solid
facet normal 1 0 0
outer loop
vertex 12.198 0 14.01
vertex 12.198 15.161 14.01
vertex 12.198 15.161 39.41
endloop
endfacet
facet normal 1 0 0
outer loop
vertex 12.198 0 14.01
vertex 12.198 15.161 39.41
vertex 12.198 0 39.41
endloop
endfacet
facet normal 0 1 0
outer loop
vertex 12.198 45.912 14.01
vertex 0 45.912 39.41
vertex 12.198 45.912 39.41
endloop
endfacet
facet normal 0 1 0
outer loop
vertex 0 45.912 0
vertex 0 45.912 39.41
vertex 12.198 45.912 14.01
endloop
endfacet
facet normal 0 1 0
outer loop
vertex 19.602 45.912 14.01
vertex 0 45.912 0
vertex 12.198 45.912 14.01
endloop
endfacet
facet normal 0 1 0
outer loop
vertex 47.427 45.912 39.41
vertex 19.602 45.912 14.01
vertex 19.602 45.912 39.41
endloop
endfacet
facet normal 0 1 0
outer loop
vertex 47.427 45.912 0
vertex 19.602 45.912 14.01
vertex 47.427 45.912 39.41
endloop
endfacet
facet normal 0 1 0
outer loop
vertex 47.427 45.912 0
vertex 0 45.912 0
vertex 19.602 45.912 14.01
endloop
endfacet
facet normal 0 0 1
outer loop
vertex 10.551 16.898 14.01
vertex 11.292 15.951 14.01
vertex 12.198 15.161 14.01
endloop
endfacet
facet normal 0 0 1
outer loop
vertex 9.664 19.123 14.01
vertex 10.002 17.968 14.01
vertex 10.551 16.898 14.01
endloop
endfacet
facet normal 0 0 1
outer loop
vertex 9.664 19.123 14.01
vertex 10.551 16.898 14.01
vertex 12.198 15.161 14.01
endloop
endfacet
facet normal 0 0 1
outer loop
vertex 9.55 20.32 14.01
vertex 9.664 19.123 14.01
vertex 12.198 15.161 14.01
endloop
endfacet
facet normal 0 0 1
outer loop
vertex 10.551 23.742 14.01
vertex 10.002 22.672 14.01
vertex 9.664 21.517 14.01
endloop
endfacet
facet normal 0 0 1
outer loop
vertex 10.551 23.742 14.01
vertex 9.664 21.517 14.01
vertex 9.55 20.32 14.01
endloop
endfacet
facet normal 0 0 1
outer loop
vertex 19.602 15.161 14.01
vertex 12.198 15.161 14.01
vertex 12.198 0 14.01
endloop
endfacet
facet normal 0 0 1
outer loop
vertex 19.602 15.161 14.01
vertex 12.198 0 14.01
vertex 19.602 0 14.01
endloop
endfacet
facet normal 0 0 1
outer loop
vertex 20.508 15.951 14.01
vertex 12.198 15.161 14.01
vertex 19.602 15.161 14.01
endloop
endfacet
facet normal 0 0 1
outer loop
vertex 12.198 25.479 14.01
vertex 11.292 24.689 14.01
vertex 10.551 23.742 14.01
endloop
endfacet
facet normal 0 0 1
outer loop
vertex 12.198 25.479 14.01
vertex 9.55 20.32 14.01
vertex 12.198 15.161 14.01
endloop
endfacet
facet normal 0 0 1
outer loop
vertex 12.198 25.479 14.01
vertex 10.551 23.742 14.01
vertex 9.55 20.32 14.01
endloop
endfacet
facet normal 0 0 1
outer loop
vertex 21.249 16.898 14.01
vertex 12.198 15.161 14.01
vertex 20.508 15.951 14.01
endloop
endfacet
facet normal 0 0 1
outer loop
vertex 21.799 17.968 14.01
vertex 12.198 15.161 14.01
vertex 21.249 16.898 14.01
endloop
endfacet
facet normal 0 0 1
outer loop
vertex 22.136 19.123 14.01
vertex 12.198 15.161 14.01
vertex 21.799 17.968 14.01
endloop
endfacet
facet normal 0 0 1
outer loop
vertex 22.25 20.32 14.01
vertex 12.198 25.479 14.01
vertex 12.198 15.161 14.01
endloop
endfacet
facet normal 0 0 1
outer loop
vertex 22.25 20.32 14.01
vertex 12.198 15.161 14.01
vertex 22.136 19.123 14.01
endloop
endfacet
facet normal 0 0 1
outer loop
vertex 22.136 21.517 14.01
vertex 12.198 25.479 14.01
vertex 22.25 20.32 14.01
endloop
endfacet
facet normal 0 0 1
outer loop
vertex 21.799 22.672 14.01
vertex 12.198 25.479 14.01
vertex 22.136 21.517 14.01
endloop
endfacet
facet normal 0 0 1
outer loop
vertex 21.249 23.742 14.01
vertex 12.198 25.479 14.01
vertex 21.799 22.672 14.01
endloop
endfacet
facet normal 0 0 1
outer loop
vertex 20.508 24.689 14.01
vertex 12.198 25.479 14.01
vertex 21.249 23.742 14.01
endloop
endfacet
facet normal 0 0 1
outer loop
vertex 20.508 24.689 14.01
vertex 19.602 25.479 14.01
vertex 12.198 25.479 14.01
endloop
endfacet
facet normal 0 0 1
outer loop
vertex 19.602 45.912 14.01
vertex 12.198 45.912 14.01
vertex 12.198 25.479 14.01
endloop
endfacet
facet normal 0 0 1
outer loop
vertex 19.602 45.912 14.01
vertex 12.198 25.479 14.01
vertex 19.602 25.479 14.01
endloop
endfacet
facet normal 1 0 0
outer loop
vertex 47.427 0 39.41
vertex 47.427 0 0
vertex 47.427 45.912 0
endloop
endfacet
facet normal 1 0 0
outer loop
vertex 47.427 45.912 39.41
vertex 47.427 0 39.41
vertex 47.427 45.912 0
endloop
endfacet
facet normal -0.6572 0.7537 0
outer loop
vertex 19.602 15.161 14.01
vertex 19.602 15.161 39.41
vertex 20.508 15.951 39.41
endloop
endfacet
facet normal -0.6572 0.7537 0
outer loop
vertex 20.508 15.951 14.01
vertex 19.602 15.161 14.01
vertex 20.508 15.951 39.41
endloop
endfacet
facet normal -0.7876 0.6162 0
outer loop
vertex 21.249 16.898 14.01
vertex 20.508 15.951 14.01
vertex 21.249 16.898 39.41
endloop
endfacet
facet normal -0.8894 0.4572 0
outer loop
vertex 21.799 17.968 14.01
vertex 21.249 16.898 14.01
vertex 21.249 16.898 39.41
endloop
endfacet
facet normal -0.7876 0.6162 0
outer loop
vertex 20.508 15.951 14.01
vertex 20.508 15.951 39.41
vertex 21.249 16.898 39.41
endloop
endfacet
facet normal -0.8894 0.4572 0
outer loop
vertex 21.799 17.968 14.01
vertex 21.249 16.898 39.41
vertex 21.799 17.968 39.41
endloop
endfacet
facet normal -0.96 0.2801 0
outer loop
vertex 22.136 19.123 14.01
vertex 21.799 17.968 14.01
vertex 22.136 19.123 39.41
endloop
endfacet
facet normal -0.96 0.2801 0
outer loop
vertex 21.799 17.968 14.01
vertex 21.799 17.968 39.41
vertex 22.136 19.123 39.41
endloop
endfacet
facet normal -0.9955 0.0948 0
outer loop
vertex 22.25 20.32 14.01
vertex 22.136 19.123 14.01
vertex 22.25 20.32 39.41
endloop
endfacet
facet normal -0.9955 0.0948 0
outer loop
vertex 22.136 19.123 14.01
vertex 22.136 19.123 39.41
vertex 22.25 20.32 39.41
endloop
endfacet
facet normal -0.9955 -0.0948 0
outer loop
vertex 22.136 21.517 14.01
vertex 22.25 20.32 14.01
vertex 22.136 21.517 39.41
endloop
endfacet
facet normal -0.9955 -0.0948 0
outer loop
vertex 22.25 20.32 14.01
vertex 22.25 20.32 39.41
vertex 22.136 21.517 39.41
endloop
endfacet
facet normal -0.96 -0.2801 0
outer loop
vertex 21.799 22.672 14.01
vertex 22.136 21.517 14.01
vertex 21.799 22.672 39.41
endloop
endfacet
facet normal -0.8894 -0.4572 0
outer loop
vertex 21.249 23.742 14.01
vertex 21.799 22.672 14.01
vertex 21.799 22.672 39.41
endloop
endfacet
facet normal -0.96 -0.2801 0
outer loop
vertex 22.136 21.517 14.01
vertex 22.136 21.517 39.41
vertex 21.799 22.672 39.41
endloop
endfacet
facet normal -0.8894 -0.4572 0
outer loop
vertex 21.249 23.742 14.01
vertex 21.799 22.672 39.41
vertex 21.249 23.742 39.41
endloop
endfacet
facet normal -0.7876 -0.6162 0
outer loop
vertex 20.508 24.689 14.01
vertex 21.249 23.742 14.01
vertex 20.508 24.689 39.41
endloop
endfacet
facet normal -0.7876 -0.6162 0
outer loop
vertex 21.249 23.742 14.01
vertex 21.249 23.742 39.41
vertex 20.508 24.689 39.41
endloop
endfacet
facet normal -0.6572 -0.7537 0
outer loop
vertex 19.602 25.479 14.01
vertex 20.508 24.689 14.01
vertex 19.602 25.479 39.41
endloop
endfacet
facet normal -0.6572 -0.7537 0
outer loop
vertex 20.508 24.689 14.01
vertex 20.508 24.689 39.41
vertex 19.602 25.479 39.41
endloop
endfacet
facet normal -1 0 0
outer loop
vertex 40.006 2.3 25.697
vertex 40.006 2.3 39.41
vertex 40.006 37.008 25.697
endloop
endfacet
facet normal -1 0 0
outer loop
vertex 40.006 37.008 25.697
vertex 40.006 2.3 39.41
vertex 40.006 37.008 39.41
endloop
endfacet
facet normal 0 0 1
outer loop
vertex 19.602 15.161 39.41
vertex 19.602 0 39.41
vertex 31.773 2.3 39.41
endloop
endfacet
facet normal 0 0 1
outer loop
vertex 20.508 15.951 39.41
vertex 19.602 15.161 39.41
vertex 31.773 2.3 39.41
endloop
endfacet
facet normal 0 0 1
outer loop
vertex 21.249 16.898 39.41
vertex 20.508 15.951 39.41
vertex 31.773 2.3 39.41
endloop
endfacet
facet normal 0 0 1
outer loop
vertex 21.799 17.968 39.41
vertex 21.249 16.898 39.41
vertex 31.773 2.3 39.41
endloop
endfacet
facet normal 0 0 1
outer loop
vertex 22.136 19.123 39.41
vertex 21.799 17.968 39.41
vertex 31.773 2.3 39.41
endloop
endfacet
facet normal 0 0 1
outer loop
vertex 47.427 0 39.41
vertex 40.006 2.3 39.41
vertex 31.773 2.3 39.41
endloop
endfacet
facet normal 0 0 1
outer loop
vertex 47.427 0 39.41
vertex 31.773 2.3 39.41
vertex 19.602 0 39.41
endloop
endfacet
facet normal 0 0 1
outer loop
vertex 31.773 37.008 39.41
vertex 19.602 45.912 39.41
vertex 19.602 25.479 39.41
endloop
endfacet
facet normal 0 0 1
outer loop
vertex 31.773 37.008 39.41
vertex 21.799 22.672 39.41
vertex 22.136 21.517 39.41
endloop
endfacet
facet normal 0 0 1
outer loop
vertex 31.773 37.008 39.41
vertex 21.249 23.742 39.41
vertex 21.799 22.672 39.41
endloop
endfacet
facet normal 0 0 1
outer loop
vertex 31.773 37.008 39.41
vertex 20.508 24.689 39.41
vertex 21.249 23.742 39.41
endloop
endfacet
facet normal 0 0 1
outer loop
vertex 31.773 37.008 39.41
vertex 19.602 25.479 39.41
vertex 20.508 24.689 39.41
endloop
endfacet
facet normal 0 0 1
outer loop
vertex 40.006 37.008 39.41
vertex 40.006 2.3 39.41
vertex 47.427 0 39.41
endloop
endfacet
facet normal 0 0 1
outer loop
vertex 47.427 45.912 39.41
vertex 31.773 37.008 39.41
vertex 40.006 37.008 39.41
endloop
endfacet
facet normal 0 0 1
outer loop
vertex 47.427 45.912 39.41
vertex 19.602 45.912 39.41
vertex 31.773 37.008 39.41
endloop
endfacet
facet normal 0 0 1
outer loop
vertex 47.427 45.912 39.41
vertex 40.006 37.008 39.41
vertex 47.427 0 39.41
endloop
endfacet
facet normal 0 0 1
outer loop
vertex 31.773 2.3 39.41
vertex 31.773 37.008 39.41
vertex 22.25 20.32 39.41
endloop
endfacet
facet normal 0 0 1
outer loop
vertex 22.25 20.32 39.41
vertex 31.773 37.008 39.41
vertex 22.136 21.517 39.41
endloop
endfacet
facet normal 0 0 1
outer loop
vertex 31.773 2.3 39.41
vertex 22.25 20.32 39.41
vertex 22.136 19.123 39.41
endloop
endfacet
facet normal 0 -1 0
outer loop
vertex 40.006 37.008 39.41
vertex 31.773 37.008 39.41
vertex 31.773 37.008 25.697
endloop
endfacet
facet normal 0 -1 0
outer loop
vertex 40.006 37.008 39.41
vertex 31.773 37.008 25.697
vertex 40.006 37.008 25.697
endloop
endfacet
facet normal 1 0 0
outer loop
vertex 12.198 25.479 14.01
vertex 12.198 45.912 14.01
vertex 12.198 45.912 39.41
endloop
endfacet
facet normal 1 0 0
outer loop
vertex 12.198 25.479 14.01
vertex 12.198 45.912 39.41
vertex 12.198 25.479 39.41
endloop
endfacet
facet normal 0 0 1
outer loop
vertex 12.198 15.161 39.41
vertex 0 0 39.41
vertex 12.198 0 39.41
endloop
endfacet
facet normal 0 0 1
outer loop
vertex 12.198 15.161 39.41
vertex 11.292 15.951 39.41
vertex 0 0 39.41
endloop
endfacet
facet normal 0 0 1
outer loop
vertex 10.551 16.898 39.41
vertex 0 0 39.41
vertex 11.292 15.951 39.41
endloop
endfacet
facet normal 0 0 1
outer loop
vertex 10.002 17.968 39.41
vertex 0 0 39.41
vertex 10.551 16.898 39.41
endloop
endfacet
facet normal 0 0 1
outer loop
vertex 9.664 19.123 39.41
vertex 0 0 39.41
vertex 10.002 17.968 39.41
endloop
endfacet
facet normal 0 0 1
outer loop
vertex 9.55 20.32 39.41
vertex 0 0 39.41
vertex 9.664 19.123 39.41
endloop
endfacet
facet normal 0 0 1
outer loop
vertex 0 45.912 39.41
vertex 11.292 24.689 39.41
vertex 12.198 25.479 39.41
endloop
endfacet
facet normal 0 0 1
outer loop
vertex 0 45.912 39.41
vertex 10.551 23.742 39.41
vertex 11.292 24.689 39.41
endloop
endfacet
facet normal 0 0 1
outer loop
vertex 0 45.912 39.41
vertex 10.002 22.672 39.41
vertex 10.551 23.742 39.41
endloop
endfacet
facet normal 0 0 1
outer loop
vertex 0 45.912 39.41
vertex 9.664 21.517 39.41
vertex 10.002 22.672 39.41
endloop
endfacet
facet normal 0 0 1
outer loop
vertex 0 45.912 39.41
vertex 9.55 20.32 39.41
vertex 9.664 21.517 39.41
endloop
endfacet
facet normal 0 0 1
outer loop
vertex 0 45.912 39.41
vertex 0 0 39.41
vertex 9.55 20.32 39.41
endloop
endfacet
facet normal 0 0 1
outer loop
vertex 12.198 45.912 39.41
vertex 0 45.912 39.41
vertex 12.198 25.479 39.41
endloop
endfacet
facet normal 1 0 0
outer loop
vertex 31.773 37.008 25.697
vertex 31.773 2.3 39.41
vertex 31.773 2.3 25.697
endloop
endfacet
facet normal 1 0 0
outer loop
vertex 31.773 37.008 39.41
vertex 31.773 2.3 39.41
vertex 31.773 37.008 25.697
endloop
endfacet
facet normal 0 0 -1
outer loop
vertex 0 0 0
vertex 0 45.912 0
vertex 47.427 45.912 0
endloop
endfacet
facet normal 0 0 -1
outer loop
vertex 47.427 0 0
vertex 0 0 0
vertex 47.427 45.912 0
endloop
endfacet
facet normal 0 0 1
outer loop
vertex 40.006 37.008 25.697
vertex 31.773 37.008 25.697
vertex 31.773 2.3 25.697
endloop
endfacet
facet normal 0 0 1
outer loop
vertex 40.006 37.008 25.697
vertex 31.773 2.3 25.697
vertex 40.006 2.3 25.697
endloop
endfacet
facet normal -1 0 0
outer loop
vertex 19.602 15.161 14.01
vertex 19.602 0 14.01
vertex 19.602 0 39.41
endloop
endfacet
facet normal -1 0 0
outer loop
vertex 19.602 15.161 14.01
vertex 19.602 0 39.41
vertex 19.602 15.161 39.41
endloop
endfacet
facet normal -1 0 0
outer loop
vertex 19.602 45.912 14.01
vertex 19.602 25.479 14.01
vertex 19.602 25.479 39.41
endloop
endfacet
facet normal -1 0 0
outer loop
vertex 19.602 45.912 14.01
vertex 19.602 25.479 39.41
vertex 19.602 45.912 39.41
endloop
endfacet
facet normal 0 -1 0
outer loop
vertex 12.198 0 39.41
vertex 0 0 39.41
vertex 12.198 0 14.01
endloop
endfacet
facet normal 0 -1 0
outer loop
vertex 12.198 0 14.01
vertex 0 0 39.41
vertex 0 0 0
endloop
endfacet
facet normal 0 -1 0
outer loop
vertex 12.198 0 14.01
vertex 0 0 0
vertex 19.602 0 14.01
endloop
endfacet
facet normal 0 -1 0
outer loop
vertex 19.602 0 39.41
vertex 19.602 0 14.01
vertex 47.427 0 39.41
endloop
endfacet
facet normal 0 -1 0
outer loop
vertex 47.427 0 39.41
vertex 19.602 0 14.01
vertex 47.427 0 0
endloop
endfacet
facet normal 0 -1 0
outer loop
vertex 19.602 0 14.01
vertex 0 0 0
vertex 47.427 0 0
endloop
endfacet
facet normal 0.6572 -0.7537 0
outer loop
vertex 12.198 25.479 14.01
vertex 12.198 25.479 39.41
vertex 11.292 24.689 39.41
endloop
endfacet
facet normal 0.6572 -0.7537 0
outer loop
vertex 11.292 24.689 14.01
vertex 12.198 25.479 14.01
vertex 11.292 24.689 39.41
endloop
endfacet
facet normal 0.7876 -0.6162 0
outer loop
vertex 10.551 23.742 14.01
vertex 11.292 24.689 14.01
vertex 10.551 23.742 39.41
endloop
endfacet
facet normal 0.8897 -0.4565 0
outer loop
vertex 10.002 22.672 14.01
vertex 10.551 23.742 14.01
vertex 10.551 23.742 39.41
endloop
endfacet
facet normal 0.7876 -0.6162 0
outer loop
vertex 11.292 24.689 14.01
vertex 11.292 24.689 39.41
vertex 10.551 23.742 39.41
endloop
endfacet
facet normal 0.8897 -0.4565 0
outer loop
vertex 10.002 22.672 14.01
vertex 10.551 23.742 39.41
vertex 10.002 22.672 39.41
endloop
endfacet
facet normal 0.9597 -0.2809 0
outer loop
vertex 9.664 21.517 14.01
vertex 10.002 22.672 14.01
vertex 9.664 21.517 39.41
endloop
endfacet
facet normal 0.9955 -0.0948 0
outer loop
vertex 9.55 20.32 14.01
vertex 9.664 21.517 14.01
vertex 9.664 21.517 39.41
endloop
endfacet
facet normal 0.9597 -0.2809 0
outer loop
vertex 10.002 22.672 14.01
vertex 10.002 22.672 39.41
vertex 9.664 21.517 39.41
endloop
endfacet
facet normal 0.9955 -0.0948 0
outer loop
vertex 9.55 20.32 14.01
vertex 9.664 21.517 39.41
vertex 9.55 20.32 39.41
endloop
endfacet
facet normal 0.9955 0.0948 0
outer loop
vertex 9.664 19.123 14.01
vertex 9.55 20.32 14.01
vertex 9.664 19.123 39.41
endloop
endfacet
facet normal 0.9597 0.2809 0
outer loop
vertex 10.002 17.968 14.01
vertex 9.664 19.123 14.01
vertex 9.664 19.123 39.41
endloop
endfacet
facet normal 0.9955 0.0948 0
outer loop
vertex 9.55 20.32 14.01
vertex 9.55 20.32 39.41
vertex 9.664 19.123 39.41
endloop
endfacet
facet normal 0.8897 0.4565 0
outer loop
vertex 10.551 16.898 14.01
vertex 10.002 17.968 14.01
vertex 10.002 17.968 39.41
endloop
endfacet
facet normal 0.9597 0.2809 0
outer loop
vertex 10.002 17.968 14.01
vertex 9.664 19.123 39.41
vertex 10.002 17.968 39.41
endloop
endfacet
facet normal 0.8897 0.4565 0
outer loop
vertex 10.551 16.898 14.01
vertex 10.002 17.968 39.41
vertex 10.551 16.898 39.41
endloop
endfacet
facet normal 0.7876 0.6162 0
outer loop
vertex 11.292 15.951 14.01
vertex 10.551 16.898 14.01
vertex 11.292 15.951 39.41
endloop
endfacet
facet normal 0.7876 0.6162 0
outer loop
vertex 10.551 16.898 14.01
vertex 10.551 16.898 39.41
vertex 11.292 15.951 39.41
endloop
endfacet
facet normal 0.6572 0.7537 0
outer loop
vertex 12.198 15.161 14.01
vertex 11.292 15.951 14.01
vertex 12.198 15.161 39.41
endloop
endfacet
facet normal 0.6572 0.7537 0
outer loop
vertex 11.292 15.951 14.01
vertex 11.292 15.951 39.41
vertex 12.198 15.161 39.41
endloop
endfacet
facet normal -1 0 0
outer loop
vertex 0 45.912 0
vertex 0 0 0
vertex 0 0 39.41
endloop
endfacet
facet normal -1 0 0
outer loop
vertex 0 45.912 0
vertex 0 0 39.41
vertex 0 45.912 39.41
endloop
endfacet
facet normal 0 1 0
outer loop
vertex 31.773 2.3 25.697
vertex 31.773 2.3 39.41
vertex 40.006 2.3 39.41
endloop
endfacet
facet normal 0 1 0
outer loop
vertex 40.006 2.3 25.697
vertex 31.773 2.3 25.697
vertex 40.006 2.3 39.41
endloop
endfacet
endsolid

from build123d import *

# Parameters (mm, degrees)
F0_W     = 47.427326
F0_H     = 45.911986
F1_DEPTH = 39.4099
F2_W     = 8.232169
F2_H     = 34.708312
F3_DEPTH = 13.71338
F5_DEPTH = 25.4


with BuildPart() as f1:
    # F0 (on Top) → F1 (new body)
    with BuildSketch(Plane.XY):
        with Locations((23.713663, 22.955993)):
            Rectangle(F0_W, F0_H)
    extrude(amount=F1_DEPTH)

    # F2 (on face) → F3 (cut)
    with BuildSketch(Plane.XY.offset(39.4099)):
        with Locations((35.889454, 19.653977)):
            Rectangle(F2_W, F2_H)
    extrude(amount=-F3_DEPTH, mode=Mode.SUBTRACT)

    # F4 (on face) → F5 (cut)
    with BuildSketch(Plane.XY.offset(39.4099)):
        with BuildLine():
            Line((12.198345, 45.911986), (12.198345, 25.47945))
            ThreePointArc((12.198345, 25.47945), (9.550043, 20.32), (12.198345, 15.16055))
            Line((12.198345, 15.16055), (12.198345, 0))
            Line((12.198345, 0), (19.601742, 0))
            Line((19.601742, 0), (19.601742, 15.16055))
            ThreePointArc((19.601742, 15.16055), (22.250043, 20.32), (19.601742, 25.47945))
            Line((19.601742, 25.47945), (19.601742, 45.911986))
            Line((19.601742, 45.911986), (12.198345, 45.911986))
        make_face()
    extrude(amount=-F5_DEPTH, mode=Mode.SUBTRACT)


solid = f1.part
